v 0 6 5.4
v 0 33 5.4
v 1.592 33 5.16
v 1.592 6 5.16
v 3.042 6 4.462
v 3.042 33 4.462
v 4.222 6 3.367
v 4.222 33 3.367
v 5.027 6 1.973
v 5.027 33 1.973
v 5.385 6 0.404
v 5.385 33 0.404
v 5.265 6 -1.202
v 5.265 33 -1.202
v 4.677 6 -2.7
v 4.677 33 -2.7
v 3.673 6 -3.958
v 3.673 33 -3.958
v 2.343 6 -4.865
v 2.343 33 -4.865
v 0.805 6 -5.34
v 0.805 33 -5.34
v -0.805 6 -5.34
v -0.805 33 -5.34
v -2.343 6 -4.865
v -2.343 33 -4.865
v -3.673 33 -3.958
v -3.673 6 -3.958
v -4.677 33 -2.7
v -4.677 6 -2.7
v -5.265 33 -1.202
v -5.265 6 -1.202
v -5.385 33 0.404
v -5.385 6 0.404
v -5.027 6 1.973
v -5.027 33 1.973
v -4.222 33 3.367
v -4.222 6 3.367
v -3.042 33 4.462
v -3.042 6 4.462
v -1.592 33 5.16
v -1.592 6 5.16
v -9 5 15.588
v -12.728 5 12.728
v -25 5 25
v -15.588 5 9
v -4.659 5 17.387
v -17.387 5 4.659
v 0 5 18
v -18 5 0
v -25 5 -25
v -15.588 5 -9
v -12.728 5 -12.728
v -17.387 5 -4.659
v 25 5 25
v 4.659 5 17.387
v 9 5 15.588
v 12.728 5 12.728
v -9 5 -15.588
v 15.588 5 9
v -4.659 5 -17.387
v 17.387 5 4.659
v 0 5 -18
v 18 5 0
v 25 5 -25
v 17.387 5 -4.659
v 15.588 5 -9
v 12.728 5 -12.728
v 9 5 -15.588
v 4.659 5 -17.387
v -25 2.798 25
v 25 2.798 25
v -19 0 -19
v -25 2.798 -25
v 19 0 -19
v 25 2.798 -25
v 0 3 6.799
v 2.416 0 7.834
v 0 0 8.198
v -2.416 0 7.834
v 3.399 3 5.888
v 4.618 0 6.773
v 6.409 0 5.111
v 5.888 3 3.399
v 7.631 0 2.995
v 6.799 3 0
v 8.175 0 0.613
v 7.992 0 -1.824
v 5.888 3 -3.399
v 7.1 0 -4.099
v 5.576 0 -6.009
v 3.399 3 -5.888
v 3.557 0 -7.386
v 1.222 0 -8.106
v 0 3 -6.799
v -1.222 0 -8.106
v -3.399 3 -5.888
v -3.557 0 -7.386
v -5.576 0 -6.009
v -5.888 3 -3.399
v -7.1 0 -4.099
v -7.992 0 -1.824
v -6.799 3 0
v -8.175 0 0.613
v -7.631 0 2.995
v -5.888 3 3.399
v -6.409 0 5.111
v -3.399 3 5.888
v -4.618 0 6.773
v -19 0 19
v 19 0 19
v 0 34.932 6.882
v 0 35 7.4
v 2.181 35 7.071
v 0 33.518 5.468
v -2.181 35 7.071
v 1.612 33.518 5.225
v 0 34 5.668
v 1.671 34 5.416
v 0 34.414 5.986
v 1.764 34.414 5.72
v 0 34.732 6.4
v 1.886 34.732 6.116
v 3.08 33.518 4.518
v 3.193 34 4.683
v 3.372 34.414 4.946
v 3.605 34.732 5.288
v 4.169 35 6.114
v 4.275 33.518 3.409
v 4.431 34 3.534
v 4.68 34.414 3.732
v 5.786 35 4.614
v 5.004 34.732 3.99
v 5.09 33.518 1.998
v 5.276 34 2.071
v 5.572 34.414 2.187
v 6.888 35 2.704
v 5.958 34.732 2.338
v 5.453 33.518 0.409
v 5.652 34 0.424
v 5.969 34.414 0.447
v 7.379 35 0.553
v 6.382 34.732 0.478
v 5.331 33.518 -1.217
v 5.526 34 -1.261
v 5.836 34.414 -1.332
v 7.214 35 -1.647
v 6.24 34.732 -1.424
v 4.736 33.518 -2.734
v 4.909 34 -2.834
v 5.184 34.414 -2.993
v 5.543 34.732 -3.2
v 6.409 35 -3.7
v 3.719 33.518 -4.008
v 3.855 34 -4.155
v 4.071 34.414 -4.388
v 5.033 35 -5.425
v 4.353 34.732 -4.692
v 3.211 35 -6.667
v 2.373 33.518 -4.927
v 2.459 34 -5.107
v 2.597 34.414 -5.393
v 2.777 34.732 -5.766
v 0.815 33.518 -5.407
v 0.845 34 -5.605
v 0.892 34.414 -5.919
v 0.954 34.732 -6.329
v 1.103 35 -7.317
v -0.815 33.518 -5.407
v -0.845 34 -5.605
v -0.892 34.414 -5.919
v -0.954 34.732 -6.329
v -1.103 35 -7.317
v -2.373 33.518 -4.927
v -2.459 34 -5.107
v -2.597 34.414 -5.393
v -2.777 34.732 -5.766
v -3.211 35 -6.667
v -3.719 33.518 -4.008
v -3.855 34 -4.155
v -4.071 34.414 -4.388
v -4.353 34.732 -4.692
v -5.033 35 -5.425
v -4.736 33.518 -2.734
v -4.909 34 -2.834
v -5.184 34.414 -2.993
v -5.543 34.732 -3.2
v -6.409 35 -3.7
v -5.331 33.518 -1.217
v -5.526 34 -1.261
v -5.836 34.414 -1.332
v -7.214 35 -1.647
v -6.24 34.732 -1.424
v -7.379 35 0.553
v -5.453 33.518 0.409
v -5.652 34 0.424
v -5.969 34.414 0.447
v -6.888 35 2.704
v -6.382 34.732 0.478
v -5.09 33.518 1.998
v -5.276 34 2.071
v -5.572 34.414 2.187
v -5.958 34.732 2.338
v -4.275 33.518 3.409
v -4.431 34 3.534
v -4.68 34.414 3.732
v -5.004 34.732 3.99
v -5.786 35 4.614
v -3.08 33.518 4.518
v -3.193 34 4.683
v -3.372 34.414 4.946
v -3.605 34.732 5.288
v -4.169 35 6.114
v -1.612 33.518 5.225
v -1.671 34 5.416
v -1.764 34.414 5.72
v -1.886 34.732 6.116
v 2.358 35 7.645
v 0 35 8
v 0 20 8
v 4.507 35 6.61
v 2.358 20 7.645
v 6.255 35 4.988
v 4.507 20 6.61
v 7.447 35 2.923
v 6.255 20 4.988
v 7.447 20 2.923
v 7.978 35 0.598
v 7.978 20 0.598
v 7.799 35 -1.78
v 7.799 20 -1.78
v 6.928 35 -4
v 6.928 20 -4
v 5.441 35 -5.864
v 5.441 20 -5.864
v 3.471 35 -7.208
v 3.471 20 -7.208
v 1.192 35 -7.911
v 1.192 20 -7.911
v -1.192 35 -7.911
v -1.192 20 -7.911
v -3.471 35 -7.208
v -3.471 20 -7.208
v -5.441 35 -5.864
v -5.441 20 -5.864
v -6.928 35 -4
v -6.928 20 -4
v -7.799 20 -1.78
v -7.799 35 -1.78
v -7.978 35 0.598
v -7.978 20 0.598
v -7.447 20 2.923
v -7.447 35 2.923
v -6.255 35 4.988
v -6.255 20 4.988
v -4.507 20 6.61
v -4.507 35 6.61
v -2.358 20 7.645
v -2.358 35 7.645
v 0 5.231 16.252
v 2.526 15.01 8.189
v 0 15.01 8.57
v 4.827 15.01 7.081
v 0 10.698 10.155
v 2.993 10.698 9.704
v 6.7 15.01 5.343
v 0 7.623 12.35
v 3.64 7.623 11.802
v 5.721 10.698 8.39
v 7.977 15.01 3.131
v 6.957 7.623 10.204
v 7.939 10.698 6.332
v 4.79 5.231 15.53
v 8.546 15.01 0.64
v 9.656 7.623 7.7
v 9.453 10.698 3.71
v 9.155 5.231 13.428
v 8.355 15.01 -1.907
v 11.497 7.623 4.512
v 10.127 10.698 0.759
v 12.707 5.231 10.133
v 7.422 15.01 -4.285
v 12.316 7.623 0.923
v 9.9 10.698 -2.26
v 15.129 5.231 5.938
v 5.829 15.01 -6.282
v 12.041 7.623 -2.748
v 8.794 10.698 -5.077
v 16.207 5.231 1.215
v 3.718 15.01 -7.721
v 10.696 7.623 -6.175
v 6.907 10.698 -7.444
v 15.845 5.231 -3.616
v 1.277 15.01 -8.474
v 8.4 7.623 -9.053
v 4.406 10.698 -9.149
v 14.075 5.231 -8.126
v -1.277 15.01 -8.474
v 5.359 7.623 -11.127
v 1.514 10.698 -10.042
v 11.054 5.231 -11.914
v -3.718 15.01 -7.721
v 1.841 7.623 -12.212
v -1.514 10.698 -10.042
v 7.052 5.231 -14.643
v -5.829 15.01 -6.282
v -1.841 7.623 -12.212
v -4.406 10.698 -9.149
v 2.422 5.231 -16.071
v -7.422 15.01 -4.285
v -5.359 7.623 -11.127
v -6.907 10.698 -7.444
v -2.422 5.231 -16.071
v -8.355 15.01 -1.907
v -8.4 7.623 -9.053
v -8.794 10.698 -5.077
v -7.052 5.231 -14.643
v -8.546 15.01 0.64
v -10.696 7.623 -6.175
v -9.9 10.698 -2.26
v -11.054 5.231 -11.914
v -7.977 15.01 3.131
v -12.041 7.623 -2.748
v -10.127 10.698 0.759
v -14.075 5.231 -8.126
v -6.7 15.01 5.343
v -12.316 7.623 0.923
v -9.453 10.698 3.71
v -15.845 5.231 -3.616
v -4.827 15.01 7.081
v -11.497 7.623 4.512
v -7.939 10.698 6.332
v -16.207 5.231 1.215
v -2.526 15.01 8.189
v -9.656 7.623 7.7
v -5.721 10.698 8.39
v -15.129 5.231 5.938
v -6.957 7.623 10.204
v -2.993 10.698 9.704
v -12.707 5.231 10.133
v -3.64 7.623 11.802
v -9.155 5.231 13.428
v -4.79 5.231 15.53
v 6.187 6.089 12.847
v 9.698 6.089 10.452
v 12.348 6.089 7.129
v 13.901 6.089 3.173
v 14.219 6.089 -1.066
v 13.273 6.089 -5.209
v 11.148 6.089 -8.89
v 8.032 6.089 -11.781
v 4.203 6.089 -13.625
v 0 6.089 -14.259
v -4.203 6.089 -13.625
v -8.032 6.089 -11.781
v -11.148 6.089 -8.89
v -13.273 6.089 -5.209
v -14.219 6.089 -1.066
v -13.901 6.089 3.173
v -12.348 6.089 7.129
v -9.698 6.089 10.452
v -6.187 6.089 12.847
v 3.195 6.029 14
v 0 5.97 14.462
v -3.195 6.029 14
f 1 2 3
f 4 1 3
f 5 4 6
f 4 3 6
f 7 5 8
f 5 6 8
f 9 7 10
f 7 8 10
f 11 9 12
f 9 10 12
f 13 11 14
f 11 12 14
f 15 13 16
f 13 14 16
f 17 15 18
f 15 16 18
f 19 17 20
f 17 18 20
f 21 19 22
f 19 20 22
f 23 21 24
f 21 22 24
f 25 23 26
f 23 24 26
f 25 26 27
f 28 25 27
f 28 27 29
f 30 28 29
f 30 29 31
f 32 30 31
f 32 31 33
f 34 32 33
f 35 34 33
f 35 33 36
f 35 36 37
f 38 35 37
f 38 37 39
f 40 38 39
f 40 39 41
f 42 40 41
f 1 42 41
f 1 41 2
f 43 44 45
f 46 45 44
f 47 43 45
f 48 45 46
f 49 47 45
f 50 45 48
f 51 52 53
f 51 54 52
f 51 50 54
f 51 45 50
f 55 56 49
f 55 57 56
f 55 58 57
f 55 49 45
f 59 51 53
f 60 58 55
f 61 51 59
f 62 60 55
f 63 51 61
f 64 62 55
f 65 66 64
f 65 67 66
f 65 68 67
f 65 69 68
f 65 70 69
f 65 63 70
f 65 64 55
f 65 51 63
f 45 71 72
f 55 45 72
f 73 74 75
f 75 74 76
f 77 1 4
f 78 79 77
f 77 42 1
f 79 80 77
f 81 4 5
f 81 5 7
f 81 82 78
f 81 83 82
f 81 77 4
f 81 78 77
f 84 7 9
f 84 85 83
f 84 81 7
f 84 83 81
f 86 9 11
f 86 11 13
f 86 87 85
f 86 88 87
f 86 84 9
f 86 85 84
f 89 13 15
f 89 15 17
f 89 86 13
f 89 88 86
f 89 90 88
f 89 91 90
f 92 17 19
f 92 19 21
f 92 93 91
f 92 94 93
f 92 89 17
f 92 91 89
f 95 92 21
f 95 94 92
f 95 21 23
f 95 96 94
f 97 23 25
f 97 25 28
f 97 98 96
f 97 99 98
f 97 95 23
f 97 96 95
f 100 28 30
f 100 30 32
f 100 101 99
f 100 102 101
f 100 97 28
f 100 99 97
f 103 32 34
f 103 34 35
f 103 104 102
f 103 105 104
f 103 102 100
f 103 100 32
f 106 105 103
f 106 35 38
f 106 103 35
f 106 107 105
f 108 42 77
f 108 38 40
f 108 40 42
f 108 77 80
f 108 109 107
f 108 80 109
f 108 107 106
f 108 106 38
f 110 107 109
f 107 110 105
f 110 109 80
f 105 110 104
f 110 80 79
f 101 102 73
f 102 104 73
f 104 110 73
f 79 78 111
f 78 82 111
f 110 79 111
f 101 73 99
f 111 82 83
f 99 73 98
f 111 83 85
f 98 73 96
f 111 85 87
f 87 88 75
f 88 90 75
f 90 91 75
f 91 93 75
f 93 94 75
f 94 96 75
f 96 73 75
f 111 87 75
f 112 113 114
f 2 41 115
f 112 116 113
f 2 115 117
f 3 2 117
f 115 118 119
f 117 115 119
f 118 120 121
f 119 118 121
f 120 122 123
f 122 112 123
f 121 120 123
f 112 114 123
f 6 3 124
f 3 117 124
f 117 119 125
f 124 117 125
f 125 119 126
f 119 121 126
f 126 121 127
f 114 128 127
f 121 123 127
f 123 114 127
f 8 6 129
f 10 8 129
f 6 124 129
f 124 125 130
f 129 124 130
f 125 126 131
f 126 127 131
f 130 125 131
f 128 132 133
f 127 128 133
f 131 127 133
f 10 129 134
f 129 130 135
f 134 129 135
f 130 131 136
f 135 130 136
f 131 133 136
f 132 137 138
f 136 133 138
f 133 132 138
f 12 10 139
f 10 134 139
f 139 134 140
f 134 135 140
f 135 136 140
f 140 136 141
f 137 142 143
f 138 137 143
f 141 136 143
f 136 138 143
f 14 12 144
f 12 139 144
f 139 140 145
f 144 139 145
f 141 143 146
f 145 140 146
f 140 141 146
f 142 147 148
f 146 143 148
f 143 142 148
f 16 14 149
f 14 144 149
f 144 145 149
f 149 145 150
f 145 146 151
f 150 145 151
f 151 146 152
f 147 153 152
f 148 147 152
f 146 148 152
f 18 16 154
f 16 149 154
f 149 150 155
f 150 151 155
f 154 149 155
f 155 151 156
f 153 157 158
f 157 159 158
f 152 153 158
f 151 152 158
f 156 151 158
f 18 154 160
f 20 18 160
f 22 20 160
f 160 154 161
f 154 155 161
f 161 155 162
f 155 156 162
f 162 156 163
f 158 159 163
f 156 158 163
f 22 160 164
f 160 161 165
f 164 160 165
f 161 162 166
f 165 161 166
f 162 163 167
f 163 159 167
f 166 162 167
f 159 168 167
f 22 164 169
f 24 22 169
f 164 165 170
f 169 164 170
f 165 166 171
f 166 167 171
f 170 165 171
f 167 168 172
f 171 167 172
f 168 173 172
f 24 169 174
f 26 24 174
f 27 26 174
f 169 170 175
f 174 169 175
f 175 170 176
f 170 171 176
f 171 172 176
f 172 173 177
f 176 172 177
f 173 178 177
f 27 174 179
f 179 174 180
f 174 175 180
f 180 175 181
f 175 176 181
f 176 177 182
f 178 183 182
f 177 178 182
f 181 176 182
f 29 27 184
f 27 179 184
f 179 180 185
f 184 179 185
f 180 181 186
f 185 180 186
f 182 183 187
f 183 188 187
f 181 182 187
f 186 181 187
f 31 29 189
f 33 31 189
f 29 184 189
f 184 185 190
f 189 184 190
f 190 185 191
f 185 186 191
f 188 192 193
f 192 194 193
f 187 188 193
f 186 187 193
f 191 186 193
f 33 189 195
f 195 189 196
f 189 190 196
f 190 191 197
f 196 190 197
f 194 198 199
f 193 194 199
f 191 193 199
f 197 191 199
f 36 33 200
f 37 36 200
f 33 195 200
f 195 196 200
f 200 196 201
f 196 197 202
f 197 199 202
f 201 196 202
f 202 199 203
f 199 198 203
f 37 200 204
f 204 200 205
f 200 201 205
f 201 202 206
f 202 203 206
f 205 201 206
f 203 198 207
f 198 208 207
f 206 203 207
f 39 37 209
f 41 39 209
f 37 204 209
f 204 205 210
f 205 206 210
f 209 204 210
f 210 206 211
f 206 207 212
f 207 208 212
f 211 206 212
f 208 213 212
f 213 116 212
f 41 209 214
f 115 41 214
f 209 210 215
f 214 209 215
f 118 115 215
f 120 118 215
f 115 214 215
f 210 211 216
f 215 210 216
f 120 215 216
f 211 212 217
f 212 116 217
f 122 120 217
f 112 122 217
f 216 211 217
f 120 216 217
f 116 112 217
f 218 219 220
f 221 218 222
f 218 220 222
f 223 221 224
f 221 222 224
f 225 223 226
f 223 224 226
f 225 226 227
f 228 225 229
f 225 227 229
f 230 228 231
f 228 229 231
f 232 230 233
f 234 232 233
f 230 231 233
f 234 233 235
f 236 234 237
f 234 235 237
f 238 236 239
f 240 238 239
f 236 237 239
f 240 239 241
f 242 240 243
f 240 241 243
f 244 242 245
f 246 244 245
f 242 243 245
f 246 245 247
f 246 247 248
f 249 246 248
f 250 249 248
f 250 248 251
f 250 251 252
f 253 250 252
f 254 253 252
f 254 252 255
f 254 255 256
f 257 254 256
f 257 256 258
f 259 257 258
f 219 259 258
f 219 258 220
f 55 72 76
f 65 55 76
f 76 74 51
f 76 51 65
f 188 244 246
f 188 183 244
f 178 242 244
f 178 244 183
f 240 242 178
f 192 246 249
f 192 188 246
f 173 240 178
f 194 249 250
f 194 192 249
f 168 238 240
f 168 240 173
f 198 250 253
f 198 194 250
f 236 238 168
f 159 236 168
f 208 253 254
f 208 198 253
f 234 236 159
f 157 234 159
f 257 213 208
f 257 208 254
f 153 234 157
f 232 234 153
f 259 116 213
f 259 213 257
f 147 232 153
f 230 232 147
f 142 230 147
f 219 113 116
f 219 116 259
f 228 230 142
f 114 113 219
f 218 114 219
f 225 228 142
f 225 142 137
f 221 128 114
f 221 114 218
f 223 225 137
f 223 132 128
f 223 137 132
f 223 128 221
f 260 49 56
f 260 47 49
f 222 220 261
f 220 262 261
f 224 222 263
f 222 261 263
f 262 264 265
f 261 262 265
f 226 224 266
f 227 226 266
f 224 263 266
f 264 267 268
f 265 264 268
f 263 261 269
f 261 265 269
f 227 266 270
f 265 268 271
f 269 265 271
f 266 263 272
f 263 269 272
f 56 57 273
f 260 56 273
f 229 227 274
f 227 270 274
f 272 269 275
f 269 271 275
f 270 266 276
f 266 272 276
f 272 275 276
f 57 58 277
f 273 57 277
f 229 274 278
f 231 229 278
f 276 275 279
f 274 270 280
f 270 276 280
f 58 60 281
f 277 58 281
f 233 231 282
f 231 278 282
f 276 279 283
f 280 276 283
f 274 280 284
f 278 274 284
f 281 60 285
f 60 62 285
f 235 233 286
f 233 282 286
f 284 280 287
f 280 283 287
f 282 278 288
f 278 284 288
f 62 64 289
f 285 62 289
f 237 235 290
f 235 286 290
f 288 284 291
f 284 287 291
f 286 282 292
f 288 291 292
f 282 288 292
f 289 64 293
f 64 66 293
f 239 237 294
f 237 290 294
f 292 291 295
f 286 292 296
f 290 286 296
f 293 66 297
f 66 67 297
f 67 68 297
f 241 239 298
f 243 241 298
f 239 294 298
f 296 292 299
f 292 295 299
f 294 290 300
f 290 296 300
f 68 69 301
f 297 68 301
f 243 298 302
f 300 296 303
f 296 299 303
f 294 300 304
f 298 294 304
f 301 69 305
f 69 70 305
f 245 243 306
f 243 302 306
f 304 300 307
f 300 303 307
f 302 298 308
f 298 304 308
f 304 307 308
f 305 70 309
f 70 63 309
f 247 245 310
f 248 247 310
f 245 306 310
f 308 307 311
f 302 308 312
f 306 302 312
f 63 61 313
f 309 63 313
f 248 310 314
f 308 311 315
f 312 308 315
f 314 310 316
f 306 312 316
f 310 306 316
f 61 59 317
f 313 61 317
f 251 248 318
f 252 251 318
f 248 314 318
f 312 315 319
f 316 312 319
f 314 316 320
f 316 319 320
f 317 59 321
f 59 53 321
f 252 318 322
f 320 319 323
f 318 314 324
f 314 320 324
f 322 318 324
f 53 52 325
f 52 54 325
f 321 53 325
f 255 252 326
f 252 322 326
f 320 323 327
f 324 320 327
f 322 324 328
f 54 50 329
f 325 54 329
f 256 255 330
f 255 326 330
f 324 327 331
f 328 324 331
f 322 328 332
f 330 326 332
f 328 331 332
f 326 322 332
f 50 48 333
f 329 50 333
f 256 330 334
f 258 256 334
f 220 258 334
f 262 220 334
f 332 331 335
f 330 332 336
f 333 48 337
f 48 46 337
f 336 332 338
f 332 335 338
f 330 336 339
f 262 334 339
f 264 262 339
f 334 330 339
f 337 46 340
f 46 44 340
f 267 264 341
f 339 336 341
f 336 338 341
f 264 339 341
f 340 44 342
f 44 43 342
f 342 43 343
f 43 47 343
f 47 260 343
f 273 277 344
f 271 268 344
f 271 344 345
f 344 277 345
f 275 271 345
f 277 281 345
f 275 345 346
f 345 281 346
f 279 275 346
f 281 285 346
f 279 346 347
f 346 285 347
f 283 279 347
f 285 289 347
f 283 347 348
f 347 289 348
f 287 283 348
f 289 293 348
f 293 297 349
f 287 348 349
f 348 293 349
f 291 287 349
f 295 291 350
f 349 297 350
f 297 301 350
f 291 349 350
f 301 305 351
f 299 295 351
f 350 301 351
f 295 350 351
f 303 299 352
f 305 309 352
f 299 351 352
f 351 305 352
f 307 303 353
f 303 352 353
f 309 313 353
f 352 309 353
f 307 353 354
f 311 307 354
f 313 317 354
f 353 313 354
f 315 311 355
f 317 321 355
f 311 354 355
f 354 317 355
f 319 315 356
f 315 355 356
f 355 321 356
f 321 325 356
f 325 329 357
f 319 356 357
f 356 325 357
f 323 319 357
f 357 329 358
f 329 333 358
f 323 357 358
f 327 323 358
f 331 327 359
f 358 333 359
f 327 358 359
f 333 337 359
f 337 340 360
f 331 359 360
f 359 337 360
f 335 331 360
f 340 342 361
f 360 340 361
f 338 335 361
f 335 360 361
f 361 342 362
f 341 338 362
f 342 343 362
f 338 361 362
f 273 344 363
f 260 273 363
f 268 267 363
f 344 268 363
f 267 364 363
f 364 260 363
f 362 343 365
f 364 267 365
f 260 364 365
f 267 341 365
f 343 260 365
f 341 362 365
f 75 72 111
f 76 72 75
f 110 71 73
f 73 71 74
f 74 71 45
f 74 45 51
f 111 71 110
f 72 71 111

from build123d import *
from OCP.BRepFilletAPI import BRepFilletAPI_MakeChamfer

# Parameters (mm, degrees)
SKETCH_1_W          = 50
SKETCH_1_H          = 50
EXTRUDE_1_DEPTH     = 5
SKETCH_5_R          = 8
EXTRUDE_3_DEPTH     = 30
SKETCH_6_R          = 5.4
CUT_EXTRUDE_2_DEPTH = 50.749371855
FILLET_3_R          = 2
FILLET_2_SIZE       = 15
FILLET_2_SIZE_2     = 10
CHAMFER_1_SIZE      = 6
CHAMFER_1_SIZE2     = 2.797845949


with BuildPart() as part:
    # Эскиз1 → Бобышка-Вытянуть1 (new body)
    with BuildSketch(Plane(origin=(0, 0, 0), x_dir=(1, 0, 0), z_dir=(0, 1, 0))):
        Rectangle(SKETCH_1_W, SKETCH_1_H)
    extrude(amount=EXTRUDE_1_DEPTH)

    # Эскиз5 → Бобышка-Вытянуть3 (add)
    with BuildSketch(Plane(origin=(0, 5, 0), x_dir=(1, 0, 0), z_dir=(0, 1, 0))):
        with Locations(Location((0, 0, 0), (0, 0, 270))):
            Circle(SKETCH_5_R)
    extrude(amount=EXTRUDE_3_DEPTH)

    # Эскиз6 → Вырез-Вытянуть2 (cut, through all)
    with BuildSketch(Plane(origin=(0, 35, 0), x_dir=(1, 0, 0), z_dir=(0, 1, 0))):
        with Locations(Location((0, 0, 0), (0, 0, 270))):
            Circle(SKETCH_6_R)
    extrude(amount=-CUT_EXTRUDE_2_DEPTH, mode=Mode.SUBTRACT)

    # Скругление3
    fillet_3_edges = [part.edges().sort_by_distance(p)[0] for p in [
        (0, 35, -5.4),
    ]]
    fillet(fillet_3_edges, radius=FILLET_3_R)

    # Скругление2
    # an asymmetric fillet: 15, 10 mm, written as the material it adds along each edge
    with BuildSketch(Plane(origin=(0, 5, 0), x_dir=(0, 0, 1), z_dir=(-1, 0, 0))) as fillet_2_piece_1:
        with BuildLine():
            Bezier((8, FILLET_2_SIZE), (8, 0), (8 + FILLET_2_SIZE_2, 0), weights=[1, 0.707106781, 1])
            Line((8 + FILLET_2_SIZE_2, 0), (8, 0))
            Line((8, 0), (8, FILLET_2_SIZE))
        make_face()
    revolve(axis=Axis((0, 5, 0), (0, 1, 0)))

    # Фаска1: one chamfer whose edges measure the first distance from different faces: ONE call of the kernel's chamfer builder (chamfer() names one face for all edges)
    chamfer_1_edges_1 = [part.edges().sort_by_distance(p)[0] for p in [
        (0, 0, -5.4),
    ]]
    chamfer_1_side_1 = [part.faces().sort_by_distance(p)[0] for p in [
        (0, 16.5, -5.4),
    ]]
    chamfer_1_edges_2 = [part.edges().sort_by_distance(p)[0] for p in [
        (0, 0, 25),
        (-25, 0, 0),
        (0, 0, -25),
        (25, 0, 0),
    ]]
    chamfer_1_side_2 = [part.faces().sort_by_distance(p)[0] for p in [
        (0, 0, 24.292893219),
    ]]
    chamfer_1 = BRepFilletAPI_MakeChamfer(part.part.solid().wrapped)
    for e in chamfer_1_edges_1:
        chamfer_1.Add(CHAMFER_1_SIZE, CHAMFER_1_SIZE2, e.wrapped, chamfer_1_side_1[0].wrapped)  # the first distance lies on this face
    for e in chamfer_1_edges_2:
        chamfer_1.Add(CHAMFER_1_SIZE, CHAMFER_1_SIZE2, e.wrapped, chamfer_1_side_2[0].wrapped)  # the first distance lies on this face
    add(Compound.cast(chamfer_1.Shape()), mode=Mode.REPLACE)


solid = part.part
